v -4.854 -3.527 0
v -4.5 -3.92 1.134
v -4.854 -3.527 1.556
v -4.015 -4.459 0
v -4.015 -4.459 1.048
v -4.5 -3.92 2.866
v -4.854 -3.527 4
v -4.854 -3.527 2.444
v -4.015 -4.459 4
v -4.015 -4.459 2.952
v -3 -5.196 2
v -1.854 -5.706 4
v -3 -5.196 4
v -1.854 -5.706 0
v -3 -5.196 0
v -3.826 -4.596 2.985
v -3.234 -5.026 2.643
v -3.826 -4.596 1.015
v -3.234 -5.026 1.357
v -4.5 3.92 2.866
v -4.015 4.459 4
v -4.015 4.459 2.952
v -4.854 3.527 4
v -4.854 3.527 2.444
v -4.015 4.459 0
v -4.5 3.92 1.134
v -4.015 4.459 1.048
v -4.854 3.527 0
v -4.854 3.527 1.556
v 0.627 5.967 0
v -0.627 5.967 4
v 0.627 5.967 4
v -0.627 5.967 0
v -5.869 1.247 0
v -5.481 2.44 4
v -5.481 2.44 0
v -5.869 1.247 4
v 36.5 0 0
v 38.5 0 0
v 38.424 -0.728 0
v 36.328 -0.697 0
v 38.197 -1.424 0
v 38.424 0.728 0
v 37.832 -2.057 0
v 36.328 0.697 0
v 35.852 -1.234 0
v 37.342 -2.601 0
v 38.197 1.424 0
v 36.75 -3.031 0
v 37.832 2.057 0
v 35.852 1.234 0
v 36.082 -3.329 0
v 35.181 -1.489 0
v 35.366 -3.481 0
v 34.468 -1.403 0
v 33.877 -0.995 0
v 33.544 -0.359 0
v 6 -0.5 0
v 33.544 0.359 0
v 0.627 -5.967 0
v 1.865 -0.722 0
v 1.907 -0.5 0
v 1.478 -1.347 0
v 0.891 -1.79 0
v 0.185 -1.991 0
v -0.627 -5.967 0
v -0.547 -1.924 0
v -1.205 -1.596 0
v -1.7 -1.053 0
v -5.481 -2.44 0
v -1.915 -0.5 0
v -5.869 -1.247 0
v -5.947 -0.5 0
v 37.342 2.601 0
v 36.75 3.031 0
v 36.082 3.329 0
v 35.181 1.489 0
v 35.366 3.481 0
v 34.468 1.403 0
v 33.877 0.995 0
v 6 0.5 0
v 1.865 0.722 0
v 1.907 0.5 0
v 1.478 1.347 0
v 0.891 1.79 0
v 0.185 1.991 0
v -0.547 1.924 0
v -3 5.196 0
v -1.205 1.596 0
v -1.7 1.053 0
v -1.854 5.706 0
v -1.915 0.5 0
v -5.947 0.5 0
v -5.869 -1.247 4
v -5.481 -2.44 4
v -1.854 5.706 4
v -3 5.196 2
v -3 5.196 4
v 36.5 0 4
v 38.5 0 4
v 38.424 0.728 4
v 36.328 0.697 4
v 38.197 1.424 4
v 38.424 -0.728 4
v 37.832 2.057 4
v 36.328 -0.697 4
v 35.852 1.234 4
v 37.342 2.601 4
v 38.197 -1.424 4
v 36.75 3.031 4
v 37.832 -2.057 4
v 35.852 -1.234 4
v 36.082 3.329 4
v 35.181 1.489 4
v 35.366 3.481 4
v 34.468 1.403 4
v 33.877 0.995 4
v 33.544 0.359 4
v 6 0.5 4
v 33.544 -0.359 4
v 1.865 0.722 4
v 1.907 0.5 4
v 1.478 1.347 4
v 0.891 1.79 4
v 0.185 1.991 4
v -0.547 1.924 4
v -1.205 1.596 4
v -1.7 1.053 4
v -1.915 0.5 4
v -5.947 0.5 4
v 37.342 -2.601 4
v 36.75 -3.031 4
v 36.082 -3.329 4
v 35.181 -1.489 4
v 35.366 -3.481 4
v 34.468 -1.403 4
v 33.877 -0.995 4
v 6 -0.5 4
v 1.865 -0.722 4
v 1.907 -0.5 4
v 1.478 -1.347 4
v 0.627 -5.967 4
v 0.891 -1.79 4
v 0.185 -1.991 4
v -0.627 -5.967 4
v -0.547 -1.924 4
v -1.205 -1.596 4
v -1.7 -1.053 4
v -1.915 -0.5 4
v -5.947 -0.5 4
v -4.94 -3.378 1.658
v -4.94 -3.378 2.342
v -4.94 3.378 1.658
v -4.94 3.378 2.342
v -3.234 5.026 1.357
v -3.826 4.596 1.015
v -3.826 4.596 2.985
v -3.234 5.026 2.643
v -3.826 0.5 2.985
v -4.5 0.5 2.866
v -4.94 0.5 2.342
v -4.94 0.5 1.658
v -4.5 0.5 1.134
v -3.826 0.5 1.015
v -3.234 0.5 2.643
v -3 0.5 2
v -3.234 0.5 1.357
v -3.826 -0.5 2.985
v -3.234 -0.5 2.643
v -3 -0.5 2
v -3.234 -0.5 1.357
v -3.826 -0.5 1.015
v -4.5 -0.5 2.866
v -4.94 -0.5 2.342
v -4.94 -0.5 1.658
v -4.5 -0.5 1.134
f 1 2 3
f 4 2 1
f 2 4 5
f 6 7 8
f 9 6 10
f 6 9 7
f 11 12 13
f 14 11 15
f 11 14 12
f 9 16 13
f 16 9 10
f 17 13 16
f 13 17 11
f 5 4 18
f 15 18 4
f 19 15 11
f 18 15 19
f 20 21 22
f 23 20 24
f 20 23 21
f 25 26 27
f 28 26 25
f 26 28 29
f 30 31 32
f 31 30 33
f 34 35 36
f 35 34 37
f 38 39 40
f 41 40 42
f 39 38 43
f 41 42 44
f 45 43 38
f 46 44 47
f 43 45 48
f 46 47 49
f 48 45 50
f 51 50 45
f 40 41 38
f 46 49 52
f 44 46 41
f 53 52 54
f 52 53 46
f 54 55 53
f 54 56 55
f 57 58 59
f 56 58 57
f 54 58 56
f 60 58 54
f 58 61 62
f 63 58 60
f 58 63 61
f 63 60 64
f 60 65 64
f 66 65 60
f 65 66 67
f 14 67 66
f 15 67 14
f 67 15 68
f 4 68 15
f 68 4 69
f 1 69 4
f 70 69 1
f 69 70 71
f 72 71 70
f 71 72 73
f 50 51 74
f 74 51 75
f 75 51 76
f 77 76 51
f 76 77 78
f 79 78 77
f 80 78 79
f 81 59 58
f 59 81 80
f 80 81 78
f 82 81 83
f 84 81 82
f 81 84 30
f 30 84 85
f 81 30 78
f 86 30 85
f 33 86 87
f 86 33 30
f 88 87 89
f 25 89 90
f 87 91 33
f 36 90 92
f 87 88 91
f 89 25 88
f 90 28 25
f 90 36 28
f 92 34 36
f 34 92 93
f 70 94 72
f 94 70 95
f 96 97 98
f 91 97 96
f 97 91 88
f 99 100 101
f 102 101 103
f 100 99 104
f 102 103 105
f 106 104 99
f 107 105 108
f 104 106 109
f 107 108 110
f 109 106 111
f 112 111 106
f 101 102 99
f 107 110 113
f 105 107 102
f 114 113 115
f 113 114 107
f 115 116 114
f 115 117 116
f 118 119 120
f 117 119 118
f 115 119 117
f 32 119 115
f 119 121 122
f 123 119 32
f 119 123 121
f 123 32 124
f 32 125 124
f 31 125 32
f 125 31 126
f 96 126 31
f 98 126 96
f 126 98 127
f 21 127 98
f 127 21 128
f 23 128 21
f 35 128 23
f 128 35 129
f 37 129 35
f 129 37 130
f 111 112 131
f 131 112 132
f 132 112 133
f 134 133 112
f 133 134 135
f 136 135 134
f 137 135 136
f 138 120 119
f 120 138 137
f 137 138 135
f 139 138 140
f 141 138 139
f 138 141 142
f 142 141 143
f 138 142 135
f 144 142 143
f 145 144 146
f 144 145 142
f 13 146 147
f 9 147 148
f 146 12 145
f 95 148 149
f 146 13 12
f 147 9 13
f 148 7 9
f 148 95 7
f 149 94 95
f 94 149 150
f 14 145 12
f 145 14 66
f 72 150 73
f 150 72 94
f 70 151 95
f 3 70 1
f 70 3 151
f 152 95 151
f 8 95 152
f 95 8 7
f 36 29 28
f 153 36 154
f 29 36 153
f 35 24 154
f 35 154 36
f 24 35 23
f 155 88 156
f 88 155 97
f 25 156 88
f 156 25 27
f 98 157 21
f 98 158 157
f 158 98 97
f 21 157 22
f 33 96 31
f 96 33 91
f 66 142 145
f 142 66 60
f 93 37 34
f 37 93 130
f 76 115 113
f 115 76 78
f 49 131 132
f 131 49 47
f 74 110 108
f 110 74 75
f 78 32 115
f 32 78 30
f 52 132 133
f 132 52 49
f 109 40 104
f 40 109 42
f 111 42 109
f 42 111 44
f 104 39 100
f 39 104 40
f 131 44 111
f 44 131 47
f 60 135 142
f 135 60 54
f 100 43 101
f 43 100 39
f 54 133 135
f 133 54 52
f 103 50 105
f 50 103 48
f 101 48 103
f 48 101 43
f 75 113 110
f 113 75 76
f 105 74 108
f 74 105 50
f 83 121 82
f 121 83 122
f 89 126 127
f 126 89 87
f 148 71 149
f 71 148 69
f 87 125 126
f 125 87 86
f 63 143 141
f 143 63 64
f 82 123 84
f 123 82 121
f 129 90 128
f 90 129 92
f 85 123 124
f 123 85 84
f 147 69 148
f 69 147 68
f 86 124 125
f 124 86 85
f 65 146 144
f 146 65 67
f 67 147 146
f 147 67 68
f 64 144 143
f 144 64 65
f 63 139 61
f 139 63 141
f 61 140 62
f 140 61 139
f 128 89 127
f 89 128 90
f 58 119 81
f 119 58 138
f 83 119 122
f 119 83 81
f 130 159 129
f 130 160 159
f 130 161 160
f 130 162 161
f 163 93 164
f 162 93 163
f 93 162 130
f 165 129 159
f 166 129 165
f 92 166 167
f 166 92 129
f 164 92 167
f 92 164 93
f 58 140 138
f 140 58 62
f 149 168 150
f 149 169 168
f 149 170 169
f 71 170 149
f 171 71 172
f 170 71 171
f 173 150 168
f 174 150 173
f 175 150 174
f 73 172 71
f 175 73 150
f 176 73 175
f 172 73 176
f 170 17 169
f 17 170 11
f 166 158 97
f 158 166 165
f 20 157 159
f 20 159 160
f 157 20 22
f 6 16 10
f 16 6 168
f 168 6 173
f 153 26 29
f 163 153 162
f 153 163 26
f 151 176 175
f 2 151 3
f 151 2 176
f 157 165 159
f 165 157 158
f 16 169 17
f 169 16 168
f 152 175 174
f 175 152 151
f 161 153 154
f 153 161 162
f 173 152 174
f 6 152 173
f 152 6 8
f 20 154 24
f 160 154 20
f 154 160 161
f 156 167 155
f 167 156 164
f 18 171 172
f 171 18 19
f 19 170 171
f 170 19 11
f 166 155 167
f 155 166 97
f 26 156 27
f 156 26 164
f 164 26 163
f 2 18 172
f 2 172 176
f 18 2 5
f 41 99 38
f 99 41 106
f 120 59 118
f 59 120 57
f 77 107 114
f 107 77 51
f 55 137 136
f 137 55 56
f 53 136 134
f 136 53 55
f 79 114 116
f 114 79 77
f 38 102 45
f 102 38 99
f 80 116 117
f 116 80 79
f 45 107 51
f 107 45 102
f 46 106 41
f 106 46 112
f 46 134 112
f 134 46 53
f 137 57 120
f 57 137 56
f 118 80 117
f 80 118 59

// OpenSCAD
$fs=.75;

difference(){
	union() {
		union() {
			union() {
				cylinder(h = 4, r = 6.0000000000);
			}
		}
		hull() {
			cylinder(h = 4, r = 6.0000000000);
			translate(v = [35, 0, 0]) {
				union() {
					cylinder(d = 7, h = 4);
				}
			}
		}
		translate(v = [35, 0, 0]) {
			union() {
				cylinder(d = 7, h = 4);
			}
		}
	}
	/* Holes Below*/
	union(){
		union(){
			union(){
				cylinder(d = 4, h = 4);
			}
			translate(v = [0, 0, 0]) {
				translate(v = [0.0000000000, 0, 2.0000000000]) {
					translate(v = [-6.0000000000, -0.5000000000, -2.0000000000]) {
						cube(size = [12.0000000000, 1, 4]);
					}
				}
			}
		}
		translate(v = [-4.0000000000, 0, 2.0000000000]) {
			rotate(a = [90, 0, 0]) {
				translate(v = [0, 0, -10.0000000000]) {
					cylinder(d = 2, h = 20);
				}
			}
		}
		hull(){
			translate(v = [35, 0, 0]){
				union(){
					cylinder(d = 3, h = 4);
				}
			}
		}
		translate(v = [35, 0, 0]){
			union(){
				cylinder(d = 3, h = 4);
			}
		}
	} /* End Holes */ 
}
/***********************************************
*********      SolidPython code:      **********
************************************************
 
from solid import *
from solid import extensions
from math import *

class Object:
    pass

servo = Object()
servo.shaft = Object()
servo.shaft.d = 4
servo.shaft.r = servo.shaft.d/2.
servo.shaft.h = 4
servoShaft = cylinder(d=servo.shaft.d,h=servo.shaft.h)

grip = Object()
grip.r=servo.shaft.r+4
shaftGrip = ( cylinder(r=grip.r, h=servo.shaft.h)
	          - servoShaft.set_hole()
              - cube([2*grip.r, 1, servo.shaft.h]).align('z-').move(x=0).set_hole()
              - cylinder(d=2,h=20).center().rot(x=90).move(x=-(grip.r+servo.shaft.r)/2,z=servo.shaft.h/2.).set_hole()
               )

hornLenght = 35

hornEnd = ( cylinder(d=3+2*2, h = servo.shaft.h)
	       - cylinder(d=3, h = servo.shaft.h).set_hole()).move(x=hornLenght)

hornBody = hull(cylinder(r=grip.r, h=servo.shaft.h), hornEnd)

scene = shaftGrip + hornBody + hornEnd


scad_render_to_file(scene, 'preview.scad', '$fs=.75;')
 
 
************************************************/
